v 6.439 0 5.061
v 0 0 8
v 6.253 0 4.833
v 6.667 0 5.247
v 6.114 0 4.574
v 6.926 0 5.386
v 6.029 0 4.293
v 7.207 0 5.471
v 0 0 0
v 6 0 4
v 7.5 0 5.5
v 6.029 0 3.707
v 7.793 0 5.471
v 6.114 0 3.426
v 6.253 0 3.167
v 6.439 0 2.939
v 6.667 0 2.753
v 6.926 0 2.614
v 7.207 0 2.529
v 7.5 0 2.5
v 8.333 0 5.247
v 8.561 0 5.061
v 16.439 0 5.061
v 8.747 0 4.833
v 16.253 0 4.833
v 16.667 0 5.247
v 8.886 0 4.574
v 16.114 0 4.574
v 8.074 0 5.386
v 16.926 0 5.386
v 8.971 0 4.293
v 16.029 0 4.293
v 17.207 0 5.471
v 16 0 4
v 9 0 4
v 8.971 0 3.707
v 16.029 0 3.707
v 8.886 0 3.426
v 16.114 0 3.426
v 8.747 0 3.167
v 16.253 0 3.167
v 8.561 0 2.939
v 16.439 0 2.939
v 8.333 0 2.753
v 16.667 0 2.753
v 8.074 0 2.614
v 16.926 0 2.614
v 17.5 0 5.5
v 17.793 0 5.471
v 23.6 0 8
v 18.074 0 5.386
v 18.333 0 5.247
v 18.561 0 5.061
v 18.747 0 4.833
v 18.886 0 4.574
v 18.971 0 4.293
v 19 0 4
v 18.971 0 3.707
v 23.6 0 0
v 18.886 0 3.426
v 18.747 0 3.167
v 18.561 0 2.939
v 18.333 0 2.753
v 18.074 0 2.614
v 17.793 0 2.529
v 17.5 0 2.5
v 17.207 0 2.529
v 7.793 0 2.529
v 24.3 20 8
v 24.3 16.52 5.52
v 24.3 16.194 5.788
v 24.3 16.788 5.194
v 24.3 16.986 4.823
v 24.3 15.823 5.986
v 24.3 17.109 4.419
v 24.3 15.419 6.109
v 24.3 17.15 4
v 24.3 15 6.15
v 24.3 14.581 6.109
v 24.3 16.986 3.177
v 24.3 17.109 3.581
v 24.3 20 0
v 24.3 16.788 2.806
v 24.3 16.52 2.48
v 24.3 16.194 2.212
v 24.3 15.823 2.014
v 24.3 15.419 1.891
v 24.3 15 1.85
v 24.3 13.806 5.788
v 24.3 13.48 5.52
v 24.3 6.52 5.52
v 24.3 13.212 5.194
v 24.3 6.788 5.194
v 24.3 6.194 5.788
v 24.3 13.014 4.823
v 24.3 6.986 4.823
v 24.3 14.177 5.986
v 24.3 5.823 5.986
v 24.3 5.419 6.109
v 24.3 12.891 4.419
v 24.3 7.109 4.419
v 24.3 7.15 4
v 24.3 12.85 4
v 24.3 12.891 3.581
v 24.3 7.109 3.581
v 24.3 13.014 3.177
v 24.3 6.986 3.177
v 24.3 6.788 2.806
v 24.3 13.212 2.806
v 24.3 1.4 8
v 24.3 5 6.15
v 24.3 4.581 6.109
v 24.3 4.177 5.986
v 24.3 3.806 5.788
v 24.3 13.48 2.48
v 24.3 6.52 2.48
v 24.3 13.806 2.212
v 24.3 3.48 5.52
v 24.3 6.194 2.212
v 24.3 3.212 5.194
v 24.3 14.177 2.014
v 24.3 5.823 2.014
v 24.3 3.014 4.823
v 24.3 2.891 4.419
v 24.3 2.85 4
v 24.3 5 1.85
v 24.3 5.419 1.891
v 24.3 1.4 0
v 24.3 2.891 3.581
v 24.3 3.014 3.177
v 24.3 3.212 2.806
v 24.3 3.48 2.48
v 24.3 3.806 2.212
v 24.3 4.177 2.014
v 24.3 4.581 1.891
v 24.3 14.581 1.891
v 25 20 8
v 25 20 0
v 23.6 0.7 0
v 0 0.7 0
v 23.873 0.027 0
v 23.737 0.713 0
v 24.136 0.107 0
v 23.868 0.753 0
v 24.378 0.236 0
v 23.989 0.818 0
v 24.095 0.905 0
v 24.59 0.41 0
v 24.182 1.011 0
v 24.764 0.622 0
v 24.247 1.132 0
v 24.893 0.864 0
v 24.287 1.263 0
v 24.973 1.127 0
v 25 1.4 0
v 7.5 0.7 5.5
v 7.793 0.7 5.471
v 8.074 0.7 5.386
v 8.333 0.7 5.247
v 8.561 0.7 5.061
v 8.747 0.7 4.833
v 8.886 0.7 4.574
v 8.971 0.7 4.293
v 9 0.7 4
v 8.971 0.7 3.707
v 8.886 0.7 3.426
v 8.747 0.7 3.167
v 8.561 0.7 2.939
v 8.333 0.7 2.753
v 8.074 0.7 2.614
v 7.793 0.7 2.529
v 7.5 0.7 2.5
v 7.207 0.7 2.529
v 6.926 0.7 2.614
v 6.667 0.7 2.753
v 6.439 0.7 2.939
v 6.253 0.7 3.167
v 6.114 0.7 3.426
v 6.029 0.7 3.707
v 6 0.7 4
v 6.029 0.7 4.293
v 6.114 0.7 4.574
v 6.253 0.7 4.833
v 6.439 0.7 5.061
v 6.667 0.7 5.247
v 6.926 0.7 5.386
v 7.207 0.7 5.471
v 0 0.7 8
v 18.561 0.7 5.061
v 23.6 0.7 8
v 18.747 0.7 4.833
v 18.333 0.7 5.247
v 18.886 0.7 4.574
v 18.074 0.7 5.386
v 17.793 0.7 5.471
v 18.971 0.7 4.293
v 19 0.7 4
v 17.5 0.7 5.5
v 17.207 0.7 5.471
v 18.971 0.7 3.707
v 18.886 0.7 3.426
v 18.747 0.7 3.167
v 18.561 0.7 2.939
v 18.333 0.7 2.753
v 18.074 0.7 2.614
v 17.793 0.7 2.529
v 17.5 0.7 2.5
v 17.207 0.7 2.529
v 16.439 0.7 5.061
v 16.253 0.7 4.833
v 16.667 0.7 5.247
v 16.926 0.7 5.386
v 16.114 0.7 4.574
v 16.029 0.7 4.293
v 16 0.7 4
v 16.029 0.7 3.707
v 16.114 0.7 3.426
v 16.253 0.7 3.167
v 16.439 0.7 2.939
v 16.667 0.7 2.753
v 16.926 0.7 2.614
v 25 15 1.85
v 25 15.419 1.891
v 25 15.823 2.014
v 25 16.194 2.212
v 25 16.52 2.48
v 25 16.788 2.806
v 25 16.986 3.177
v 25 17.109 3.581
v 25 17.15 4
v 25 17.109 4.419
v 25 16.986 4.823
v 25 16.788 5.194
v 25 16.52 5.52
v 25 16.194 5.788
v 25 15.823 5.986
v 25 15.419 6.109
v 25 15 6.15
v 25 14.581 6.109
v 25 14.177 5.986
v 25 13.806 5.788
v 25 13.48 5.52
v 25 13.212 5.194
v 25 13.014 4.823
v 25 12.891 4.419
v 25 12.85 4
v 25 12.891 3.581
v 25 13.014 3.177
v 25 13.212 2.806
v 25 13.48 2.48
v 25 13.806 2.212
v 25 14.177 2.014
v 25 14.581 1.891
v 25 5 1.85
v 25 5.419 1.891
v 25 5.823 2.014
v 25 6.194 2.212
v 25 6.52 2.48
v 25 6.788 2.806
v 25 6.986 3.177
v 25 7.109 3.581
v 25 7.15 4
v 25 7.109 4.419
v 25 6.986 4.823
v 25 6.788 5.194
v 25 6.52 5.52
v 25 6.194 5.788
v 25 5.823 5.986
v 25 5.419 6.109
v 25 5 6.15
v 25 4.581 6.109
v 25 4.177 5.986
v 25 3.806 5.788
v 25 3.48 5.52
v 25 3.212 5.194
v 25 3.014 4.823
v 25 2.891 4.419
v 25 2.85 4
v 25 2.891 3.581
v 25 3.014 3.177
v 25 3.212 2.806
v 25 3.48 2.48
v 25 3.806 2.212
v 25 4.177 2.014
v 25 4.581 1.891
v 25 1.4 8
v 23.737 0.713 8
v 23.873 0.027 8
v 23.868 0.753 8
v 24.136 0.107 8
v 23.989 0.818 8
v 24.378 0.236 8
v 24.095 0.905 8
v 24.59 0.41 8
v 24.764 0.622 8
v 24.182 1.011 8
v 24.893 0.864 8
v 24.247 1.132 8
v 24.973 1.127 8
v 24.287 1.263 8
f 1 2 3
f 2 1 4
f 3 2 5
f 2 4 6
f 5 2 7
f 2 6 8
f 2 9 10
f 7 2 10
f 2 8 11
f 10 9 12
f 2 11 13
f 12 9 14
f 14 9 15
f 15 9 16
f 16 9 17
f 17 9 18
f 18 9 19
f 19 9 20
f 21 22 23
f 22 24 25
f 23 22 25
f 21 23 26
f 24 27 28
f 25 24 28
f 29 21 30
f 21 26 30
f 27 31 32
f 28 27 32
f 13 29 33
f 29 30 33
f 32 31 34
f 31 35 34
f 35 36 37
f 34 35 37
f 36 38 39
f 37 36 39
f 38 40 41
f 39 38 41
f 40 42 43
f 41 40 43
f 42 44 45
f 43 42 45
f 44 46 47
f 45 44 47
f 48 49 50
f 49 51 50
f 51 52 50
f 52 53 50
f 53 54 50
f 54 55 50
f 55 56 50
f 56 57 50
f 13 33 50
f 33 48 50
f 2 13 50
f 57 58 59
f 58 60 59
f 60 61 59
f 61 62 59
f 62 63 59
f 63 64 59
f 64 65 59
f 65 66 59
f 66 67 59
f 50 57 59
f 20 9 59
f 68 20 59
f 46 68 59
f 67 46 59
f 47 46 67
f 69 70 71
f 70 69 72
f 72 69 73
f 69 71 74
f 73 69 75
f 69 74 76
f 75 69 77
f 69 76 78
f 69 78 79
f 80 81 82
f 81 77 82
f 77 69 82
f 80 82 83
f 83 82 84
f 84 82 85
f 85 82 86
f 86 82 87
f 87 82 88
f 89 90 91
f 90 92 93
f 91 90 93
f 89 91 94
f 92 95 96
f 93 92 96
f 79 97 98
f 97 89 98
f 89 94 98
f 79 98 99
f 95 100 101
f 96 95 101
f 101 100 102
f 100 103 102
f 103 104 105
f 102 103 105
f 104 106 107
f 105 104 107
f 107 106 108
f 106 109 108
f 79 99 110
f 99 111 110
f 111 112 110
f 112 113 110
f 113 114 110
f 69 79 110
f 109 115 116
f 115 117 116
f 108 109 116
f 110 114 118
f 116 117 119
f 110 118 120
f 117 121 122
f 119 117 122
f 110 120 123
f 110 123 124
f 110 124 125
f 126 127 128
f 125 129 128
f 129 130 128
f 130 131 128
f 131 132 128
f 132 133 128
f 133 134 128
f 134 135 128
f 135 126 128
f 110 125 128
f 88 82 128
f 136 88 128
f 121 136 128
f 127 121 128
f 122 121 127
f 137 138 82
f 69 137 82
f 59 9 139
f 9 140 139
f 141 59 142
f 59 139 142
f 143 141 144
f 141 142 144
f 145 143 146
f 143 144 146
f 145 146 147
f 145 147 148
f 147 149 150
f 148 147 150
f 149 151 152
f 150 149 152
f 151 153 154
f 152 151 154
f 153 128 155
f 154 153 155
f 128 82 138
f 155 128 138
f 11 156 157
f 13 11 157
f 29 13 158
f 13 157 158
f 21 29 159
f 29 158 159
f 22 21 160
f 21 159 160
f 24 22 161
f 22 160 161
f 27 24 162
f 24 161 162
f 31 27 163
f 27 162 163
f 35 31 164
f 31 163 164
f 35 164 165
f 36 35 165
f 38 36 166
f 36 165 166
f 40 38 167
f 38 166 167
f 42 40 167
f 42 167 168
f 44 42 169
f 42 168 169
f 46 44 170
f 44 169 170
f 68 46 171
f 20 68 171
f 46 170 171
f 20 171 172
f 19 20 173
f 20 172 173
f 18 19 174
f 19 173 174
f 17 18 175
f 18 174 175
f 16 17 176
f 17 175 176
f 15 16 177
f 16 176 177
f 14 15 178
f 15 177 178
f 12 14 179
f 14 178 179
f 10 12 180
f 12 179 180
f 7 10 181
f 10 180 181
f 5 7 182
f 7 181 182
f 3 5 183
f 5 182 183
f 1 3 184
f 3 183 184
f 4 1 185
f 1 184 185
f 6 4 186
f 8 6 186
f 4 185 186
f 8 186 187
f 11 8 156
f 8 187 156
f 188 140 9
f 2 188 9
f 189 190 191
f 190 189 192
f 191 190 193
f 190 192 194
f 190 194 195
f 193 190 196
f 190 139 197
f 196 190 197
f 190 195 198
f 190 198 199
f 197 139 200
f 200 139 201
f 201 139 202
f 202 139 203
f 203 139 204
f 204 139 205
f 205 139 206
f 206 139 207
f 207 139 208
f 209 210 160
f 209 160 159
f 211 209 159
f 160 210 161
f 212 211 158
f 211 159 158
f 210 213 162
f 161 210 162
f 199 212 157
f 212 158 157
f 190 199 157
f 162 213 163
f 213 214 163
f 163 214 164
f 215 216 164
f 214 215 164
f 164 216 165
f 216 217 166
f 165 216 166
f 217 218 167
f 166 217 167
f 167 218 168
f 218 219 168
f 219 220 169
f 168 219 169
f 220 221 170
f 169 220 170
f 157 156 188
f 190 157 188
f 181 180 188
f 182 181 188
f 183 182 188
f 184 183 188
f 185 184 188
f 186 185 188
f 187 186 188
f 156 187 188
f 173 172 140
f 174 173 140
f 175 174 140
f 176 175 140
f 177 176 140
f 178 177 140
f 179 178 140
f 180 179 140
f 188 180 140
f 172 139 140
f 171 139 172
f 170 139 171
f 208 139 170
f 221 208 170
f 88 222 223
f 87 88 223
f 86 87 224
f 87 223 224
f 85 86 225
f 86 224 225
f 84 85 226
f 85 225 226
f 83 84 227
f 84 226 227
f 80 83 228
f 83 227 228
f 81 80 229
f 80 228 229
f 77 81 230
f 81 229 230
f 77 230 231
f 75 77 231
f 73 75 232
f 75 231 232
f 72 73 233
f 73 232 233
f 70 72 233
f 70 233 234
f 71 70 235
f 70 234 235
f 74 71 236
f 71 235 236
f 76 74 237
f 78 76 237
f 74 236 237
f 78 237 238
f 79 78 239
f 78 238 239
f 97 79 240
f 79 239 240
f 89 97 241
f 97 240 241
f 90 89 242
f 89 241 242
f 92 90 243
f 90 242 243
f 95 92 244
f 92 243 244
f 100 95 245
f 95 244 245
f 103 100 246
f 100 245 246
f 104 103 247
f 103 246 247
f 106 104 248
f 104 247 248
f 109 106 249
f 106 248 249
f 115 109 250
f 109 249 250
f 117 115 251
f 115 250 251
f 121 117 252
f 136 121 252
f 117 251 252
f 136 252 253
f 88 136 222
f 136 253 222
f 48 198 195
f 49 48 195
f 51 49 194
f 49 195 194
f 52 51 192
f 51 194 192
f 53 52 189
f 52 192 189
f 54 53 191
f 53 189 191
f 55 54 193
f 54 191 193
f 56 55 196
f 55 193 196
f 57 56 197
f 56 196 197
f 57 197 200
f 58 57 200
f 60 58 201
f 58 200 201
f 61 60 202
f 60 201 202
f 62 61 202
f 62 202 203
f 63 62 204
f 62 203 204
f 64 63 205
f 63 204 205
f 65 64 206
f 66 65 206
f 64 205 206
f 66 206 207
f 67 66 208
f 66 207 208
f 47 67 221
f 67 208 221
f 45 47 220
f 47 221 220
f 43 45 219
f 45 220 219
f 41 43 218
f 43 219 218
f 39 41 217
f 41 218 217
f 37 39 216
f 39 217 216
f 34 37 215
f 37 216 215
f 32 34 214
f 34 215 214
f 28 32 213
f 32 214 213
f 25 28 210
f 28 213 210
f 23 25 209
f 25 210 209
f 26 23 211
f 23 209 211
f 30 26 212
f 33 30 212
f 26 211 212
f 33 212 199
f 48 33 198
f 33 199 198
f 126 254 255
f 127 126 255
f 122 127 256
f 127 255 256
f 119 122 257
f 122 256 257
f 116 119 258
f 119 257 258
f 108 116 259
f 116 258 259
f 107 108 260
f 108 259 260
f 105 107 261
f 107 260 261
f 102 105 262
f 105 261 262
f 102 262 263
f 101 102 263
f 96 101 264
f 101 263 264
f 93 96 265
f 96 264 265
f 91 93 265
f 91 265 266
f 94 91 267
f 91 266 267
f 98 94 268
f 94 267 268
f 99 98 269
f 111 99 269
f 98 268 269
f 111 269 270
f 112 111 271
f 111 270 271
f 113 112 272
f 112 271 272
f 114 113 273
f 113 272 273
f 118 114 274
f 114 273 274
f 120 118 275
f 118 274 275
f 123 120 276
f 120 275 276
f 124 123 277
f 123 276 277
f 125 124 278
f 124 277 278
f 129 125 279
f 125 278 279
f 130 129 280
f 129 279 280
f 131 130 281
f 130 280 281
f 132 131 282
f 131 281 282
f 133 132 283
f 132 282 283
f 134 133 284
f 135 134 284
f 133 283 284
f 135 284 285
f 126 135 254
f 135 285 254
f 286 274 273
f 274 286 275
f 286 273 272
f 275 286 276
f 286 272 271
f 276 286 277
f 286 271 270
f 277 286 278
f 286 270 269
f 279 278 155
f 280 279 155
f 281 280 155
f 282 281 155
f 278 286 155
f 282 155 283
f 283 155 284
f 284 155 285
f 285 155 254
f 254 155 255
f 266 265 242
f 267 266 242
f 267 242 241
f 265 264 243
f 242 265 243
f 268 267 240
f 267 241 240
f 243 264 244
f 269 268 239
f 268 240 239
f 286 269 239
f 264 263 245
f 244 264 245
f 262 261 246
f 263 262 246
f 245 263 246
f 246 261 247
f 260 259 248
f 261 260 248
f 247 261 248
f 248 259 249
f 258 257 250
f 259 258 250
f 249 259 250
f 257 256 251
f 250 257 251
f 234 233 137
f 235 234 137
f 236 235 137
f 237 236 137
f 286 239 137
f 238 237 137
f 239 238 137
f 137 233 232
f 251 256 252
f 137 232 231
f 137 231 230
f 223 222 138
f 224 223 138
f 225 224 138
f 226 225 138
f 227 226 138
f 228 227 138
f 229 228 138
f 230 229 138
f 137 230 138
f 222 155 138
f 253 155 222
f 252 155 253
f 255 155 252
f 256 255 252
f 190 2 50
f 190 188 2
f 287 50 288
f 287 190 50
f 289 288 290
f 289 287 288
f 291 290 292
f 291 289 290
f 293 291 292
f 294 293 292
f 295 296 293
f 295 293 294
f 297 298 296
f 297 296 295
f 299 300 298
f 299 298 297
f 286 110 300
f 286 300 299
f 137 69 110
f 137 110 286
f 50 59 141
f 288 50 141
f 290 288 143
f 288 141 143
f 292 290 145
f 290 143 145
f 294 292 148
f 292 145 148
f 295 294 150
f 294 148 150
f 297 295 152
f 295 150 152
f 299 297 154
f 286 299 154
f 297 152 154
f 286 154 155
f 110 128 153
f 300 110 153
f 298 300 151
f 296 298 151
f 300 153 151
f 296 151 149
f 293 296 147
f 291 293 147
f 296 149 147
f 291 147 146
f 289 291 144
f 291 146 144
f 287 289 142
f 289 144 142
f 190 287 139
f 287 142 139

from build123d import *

# Parameters (mm, degrees)
BASE_FLANGE1_DEPTH = 8
SKETCH6_R          = 1.5
CUT_EXTRUDE1_DEPTH = 0.7
SKETCH7_R          = 2.15
CUT_EXTRUDE2_DEPTH = 0.7


# Sheet-metal steps are written as plain solids
with BuildPart() as part:
    # Sketch1 → Base-Flange1 (new body)
    with BuildSketch(Plane.XY):
        with BuildLine():
            Line((0, 0), (23.6, 0))
            ThreePointArc((23.6, 0), (24.589949494, 0.410050506), (25, 1.4))
            Line((25, 1.4), (25, 20))
            Line((25, 20), (24.3, 20))
            Line((24.3, 20), (24.3, 1.4))
            ThreePointArc((24.3, 1.4), (24.094974747, 0.905025253), (23.6, 0.7))
            Line((23.6, 0.7), (0, 0.7))
            Line((0, 0.7), (0, 0))
        make_face()
    extrude(amount=BASE_FLANGE1_DEPTH)

    # Sketch6 → Cut-Extrude1 (cut)
    with BuildSketch(Plane(origin=(0, 0.7, 0), x_dir=(1, 0, 0), z_dir=(0, 1, 0))):
        with Locations(Location((7.5, -4, 0), (0, 0, 270))):
            Circle(SKETCH6_R)
        with Locations(Location((17.5, -4, 0), (0, 0, 270))):
            Circle(SKETCH6_R)
    extrude(amount=-CUT_EXTRUDE1_DEPTH, mode=Mode.SUBTRACT)

    # Sketch7 → Cut-Extrude2 (cut)
    with BuildSketch(Plane(origin=(25, 0, 0), x_dir=(0, 0, -1), z_dir=(1, 0, 0))):
        with Locations((-4, 15)):
            Circle(SKETCH7_R)
        with Locations((-4, 5)):
            Circle(SKETCH7_R)
    extrude(amount=-CUT_EXTRUDE2_DEPTH, mode=Mode.SUBTRACT)


solid = part.part
